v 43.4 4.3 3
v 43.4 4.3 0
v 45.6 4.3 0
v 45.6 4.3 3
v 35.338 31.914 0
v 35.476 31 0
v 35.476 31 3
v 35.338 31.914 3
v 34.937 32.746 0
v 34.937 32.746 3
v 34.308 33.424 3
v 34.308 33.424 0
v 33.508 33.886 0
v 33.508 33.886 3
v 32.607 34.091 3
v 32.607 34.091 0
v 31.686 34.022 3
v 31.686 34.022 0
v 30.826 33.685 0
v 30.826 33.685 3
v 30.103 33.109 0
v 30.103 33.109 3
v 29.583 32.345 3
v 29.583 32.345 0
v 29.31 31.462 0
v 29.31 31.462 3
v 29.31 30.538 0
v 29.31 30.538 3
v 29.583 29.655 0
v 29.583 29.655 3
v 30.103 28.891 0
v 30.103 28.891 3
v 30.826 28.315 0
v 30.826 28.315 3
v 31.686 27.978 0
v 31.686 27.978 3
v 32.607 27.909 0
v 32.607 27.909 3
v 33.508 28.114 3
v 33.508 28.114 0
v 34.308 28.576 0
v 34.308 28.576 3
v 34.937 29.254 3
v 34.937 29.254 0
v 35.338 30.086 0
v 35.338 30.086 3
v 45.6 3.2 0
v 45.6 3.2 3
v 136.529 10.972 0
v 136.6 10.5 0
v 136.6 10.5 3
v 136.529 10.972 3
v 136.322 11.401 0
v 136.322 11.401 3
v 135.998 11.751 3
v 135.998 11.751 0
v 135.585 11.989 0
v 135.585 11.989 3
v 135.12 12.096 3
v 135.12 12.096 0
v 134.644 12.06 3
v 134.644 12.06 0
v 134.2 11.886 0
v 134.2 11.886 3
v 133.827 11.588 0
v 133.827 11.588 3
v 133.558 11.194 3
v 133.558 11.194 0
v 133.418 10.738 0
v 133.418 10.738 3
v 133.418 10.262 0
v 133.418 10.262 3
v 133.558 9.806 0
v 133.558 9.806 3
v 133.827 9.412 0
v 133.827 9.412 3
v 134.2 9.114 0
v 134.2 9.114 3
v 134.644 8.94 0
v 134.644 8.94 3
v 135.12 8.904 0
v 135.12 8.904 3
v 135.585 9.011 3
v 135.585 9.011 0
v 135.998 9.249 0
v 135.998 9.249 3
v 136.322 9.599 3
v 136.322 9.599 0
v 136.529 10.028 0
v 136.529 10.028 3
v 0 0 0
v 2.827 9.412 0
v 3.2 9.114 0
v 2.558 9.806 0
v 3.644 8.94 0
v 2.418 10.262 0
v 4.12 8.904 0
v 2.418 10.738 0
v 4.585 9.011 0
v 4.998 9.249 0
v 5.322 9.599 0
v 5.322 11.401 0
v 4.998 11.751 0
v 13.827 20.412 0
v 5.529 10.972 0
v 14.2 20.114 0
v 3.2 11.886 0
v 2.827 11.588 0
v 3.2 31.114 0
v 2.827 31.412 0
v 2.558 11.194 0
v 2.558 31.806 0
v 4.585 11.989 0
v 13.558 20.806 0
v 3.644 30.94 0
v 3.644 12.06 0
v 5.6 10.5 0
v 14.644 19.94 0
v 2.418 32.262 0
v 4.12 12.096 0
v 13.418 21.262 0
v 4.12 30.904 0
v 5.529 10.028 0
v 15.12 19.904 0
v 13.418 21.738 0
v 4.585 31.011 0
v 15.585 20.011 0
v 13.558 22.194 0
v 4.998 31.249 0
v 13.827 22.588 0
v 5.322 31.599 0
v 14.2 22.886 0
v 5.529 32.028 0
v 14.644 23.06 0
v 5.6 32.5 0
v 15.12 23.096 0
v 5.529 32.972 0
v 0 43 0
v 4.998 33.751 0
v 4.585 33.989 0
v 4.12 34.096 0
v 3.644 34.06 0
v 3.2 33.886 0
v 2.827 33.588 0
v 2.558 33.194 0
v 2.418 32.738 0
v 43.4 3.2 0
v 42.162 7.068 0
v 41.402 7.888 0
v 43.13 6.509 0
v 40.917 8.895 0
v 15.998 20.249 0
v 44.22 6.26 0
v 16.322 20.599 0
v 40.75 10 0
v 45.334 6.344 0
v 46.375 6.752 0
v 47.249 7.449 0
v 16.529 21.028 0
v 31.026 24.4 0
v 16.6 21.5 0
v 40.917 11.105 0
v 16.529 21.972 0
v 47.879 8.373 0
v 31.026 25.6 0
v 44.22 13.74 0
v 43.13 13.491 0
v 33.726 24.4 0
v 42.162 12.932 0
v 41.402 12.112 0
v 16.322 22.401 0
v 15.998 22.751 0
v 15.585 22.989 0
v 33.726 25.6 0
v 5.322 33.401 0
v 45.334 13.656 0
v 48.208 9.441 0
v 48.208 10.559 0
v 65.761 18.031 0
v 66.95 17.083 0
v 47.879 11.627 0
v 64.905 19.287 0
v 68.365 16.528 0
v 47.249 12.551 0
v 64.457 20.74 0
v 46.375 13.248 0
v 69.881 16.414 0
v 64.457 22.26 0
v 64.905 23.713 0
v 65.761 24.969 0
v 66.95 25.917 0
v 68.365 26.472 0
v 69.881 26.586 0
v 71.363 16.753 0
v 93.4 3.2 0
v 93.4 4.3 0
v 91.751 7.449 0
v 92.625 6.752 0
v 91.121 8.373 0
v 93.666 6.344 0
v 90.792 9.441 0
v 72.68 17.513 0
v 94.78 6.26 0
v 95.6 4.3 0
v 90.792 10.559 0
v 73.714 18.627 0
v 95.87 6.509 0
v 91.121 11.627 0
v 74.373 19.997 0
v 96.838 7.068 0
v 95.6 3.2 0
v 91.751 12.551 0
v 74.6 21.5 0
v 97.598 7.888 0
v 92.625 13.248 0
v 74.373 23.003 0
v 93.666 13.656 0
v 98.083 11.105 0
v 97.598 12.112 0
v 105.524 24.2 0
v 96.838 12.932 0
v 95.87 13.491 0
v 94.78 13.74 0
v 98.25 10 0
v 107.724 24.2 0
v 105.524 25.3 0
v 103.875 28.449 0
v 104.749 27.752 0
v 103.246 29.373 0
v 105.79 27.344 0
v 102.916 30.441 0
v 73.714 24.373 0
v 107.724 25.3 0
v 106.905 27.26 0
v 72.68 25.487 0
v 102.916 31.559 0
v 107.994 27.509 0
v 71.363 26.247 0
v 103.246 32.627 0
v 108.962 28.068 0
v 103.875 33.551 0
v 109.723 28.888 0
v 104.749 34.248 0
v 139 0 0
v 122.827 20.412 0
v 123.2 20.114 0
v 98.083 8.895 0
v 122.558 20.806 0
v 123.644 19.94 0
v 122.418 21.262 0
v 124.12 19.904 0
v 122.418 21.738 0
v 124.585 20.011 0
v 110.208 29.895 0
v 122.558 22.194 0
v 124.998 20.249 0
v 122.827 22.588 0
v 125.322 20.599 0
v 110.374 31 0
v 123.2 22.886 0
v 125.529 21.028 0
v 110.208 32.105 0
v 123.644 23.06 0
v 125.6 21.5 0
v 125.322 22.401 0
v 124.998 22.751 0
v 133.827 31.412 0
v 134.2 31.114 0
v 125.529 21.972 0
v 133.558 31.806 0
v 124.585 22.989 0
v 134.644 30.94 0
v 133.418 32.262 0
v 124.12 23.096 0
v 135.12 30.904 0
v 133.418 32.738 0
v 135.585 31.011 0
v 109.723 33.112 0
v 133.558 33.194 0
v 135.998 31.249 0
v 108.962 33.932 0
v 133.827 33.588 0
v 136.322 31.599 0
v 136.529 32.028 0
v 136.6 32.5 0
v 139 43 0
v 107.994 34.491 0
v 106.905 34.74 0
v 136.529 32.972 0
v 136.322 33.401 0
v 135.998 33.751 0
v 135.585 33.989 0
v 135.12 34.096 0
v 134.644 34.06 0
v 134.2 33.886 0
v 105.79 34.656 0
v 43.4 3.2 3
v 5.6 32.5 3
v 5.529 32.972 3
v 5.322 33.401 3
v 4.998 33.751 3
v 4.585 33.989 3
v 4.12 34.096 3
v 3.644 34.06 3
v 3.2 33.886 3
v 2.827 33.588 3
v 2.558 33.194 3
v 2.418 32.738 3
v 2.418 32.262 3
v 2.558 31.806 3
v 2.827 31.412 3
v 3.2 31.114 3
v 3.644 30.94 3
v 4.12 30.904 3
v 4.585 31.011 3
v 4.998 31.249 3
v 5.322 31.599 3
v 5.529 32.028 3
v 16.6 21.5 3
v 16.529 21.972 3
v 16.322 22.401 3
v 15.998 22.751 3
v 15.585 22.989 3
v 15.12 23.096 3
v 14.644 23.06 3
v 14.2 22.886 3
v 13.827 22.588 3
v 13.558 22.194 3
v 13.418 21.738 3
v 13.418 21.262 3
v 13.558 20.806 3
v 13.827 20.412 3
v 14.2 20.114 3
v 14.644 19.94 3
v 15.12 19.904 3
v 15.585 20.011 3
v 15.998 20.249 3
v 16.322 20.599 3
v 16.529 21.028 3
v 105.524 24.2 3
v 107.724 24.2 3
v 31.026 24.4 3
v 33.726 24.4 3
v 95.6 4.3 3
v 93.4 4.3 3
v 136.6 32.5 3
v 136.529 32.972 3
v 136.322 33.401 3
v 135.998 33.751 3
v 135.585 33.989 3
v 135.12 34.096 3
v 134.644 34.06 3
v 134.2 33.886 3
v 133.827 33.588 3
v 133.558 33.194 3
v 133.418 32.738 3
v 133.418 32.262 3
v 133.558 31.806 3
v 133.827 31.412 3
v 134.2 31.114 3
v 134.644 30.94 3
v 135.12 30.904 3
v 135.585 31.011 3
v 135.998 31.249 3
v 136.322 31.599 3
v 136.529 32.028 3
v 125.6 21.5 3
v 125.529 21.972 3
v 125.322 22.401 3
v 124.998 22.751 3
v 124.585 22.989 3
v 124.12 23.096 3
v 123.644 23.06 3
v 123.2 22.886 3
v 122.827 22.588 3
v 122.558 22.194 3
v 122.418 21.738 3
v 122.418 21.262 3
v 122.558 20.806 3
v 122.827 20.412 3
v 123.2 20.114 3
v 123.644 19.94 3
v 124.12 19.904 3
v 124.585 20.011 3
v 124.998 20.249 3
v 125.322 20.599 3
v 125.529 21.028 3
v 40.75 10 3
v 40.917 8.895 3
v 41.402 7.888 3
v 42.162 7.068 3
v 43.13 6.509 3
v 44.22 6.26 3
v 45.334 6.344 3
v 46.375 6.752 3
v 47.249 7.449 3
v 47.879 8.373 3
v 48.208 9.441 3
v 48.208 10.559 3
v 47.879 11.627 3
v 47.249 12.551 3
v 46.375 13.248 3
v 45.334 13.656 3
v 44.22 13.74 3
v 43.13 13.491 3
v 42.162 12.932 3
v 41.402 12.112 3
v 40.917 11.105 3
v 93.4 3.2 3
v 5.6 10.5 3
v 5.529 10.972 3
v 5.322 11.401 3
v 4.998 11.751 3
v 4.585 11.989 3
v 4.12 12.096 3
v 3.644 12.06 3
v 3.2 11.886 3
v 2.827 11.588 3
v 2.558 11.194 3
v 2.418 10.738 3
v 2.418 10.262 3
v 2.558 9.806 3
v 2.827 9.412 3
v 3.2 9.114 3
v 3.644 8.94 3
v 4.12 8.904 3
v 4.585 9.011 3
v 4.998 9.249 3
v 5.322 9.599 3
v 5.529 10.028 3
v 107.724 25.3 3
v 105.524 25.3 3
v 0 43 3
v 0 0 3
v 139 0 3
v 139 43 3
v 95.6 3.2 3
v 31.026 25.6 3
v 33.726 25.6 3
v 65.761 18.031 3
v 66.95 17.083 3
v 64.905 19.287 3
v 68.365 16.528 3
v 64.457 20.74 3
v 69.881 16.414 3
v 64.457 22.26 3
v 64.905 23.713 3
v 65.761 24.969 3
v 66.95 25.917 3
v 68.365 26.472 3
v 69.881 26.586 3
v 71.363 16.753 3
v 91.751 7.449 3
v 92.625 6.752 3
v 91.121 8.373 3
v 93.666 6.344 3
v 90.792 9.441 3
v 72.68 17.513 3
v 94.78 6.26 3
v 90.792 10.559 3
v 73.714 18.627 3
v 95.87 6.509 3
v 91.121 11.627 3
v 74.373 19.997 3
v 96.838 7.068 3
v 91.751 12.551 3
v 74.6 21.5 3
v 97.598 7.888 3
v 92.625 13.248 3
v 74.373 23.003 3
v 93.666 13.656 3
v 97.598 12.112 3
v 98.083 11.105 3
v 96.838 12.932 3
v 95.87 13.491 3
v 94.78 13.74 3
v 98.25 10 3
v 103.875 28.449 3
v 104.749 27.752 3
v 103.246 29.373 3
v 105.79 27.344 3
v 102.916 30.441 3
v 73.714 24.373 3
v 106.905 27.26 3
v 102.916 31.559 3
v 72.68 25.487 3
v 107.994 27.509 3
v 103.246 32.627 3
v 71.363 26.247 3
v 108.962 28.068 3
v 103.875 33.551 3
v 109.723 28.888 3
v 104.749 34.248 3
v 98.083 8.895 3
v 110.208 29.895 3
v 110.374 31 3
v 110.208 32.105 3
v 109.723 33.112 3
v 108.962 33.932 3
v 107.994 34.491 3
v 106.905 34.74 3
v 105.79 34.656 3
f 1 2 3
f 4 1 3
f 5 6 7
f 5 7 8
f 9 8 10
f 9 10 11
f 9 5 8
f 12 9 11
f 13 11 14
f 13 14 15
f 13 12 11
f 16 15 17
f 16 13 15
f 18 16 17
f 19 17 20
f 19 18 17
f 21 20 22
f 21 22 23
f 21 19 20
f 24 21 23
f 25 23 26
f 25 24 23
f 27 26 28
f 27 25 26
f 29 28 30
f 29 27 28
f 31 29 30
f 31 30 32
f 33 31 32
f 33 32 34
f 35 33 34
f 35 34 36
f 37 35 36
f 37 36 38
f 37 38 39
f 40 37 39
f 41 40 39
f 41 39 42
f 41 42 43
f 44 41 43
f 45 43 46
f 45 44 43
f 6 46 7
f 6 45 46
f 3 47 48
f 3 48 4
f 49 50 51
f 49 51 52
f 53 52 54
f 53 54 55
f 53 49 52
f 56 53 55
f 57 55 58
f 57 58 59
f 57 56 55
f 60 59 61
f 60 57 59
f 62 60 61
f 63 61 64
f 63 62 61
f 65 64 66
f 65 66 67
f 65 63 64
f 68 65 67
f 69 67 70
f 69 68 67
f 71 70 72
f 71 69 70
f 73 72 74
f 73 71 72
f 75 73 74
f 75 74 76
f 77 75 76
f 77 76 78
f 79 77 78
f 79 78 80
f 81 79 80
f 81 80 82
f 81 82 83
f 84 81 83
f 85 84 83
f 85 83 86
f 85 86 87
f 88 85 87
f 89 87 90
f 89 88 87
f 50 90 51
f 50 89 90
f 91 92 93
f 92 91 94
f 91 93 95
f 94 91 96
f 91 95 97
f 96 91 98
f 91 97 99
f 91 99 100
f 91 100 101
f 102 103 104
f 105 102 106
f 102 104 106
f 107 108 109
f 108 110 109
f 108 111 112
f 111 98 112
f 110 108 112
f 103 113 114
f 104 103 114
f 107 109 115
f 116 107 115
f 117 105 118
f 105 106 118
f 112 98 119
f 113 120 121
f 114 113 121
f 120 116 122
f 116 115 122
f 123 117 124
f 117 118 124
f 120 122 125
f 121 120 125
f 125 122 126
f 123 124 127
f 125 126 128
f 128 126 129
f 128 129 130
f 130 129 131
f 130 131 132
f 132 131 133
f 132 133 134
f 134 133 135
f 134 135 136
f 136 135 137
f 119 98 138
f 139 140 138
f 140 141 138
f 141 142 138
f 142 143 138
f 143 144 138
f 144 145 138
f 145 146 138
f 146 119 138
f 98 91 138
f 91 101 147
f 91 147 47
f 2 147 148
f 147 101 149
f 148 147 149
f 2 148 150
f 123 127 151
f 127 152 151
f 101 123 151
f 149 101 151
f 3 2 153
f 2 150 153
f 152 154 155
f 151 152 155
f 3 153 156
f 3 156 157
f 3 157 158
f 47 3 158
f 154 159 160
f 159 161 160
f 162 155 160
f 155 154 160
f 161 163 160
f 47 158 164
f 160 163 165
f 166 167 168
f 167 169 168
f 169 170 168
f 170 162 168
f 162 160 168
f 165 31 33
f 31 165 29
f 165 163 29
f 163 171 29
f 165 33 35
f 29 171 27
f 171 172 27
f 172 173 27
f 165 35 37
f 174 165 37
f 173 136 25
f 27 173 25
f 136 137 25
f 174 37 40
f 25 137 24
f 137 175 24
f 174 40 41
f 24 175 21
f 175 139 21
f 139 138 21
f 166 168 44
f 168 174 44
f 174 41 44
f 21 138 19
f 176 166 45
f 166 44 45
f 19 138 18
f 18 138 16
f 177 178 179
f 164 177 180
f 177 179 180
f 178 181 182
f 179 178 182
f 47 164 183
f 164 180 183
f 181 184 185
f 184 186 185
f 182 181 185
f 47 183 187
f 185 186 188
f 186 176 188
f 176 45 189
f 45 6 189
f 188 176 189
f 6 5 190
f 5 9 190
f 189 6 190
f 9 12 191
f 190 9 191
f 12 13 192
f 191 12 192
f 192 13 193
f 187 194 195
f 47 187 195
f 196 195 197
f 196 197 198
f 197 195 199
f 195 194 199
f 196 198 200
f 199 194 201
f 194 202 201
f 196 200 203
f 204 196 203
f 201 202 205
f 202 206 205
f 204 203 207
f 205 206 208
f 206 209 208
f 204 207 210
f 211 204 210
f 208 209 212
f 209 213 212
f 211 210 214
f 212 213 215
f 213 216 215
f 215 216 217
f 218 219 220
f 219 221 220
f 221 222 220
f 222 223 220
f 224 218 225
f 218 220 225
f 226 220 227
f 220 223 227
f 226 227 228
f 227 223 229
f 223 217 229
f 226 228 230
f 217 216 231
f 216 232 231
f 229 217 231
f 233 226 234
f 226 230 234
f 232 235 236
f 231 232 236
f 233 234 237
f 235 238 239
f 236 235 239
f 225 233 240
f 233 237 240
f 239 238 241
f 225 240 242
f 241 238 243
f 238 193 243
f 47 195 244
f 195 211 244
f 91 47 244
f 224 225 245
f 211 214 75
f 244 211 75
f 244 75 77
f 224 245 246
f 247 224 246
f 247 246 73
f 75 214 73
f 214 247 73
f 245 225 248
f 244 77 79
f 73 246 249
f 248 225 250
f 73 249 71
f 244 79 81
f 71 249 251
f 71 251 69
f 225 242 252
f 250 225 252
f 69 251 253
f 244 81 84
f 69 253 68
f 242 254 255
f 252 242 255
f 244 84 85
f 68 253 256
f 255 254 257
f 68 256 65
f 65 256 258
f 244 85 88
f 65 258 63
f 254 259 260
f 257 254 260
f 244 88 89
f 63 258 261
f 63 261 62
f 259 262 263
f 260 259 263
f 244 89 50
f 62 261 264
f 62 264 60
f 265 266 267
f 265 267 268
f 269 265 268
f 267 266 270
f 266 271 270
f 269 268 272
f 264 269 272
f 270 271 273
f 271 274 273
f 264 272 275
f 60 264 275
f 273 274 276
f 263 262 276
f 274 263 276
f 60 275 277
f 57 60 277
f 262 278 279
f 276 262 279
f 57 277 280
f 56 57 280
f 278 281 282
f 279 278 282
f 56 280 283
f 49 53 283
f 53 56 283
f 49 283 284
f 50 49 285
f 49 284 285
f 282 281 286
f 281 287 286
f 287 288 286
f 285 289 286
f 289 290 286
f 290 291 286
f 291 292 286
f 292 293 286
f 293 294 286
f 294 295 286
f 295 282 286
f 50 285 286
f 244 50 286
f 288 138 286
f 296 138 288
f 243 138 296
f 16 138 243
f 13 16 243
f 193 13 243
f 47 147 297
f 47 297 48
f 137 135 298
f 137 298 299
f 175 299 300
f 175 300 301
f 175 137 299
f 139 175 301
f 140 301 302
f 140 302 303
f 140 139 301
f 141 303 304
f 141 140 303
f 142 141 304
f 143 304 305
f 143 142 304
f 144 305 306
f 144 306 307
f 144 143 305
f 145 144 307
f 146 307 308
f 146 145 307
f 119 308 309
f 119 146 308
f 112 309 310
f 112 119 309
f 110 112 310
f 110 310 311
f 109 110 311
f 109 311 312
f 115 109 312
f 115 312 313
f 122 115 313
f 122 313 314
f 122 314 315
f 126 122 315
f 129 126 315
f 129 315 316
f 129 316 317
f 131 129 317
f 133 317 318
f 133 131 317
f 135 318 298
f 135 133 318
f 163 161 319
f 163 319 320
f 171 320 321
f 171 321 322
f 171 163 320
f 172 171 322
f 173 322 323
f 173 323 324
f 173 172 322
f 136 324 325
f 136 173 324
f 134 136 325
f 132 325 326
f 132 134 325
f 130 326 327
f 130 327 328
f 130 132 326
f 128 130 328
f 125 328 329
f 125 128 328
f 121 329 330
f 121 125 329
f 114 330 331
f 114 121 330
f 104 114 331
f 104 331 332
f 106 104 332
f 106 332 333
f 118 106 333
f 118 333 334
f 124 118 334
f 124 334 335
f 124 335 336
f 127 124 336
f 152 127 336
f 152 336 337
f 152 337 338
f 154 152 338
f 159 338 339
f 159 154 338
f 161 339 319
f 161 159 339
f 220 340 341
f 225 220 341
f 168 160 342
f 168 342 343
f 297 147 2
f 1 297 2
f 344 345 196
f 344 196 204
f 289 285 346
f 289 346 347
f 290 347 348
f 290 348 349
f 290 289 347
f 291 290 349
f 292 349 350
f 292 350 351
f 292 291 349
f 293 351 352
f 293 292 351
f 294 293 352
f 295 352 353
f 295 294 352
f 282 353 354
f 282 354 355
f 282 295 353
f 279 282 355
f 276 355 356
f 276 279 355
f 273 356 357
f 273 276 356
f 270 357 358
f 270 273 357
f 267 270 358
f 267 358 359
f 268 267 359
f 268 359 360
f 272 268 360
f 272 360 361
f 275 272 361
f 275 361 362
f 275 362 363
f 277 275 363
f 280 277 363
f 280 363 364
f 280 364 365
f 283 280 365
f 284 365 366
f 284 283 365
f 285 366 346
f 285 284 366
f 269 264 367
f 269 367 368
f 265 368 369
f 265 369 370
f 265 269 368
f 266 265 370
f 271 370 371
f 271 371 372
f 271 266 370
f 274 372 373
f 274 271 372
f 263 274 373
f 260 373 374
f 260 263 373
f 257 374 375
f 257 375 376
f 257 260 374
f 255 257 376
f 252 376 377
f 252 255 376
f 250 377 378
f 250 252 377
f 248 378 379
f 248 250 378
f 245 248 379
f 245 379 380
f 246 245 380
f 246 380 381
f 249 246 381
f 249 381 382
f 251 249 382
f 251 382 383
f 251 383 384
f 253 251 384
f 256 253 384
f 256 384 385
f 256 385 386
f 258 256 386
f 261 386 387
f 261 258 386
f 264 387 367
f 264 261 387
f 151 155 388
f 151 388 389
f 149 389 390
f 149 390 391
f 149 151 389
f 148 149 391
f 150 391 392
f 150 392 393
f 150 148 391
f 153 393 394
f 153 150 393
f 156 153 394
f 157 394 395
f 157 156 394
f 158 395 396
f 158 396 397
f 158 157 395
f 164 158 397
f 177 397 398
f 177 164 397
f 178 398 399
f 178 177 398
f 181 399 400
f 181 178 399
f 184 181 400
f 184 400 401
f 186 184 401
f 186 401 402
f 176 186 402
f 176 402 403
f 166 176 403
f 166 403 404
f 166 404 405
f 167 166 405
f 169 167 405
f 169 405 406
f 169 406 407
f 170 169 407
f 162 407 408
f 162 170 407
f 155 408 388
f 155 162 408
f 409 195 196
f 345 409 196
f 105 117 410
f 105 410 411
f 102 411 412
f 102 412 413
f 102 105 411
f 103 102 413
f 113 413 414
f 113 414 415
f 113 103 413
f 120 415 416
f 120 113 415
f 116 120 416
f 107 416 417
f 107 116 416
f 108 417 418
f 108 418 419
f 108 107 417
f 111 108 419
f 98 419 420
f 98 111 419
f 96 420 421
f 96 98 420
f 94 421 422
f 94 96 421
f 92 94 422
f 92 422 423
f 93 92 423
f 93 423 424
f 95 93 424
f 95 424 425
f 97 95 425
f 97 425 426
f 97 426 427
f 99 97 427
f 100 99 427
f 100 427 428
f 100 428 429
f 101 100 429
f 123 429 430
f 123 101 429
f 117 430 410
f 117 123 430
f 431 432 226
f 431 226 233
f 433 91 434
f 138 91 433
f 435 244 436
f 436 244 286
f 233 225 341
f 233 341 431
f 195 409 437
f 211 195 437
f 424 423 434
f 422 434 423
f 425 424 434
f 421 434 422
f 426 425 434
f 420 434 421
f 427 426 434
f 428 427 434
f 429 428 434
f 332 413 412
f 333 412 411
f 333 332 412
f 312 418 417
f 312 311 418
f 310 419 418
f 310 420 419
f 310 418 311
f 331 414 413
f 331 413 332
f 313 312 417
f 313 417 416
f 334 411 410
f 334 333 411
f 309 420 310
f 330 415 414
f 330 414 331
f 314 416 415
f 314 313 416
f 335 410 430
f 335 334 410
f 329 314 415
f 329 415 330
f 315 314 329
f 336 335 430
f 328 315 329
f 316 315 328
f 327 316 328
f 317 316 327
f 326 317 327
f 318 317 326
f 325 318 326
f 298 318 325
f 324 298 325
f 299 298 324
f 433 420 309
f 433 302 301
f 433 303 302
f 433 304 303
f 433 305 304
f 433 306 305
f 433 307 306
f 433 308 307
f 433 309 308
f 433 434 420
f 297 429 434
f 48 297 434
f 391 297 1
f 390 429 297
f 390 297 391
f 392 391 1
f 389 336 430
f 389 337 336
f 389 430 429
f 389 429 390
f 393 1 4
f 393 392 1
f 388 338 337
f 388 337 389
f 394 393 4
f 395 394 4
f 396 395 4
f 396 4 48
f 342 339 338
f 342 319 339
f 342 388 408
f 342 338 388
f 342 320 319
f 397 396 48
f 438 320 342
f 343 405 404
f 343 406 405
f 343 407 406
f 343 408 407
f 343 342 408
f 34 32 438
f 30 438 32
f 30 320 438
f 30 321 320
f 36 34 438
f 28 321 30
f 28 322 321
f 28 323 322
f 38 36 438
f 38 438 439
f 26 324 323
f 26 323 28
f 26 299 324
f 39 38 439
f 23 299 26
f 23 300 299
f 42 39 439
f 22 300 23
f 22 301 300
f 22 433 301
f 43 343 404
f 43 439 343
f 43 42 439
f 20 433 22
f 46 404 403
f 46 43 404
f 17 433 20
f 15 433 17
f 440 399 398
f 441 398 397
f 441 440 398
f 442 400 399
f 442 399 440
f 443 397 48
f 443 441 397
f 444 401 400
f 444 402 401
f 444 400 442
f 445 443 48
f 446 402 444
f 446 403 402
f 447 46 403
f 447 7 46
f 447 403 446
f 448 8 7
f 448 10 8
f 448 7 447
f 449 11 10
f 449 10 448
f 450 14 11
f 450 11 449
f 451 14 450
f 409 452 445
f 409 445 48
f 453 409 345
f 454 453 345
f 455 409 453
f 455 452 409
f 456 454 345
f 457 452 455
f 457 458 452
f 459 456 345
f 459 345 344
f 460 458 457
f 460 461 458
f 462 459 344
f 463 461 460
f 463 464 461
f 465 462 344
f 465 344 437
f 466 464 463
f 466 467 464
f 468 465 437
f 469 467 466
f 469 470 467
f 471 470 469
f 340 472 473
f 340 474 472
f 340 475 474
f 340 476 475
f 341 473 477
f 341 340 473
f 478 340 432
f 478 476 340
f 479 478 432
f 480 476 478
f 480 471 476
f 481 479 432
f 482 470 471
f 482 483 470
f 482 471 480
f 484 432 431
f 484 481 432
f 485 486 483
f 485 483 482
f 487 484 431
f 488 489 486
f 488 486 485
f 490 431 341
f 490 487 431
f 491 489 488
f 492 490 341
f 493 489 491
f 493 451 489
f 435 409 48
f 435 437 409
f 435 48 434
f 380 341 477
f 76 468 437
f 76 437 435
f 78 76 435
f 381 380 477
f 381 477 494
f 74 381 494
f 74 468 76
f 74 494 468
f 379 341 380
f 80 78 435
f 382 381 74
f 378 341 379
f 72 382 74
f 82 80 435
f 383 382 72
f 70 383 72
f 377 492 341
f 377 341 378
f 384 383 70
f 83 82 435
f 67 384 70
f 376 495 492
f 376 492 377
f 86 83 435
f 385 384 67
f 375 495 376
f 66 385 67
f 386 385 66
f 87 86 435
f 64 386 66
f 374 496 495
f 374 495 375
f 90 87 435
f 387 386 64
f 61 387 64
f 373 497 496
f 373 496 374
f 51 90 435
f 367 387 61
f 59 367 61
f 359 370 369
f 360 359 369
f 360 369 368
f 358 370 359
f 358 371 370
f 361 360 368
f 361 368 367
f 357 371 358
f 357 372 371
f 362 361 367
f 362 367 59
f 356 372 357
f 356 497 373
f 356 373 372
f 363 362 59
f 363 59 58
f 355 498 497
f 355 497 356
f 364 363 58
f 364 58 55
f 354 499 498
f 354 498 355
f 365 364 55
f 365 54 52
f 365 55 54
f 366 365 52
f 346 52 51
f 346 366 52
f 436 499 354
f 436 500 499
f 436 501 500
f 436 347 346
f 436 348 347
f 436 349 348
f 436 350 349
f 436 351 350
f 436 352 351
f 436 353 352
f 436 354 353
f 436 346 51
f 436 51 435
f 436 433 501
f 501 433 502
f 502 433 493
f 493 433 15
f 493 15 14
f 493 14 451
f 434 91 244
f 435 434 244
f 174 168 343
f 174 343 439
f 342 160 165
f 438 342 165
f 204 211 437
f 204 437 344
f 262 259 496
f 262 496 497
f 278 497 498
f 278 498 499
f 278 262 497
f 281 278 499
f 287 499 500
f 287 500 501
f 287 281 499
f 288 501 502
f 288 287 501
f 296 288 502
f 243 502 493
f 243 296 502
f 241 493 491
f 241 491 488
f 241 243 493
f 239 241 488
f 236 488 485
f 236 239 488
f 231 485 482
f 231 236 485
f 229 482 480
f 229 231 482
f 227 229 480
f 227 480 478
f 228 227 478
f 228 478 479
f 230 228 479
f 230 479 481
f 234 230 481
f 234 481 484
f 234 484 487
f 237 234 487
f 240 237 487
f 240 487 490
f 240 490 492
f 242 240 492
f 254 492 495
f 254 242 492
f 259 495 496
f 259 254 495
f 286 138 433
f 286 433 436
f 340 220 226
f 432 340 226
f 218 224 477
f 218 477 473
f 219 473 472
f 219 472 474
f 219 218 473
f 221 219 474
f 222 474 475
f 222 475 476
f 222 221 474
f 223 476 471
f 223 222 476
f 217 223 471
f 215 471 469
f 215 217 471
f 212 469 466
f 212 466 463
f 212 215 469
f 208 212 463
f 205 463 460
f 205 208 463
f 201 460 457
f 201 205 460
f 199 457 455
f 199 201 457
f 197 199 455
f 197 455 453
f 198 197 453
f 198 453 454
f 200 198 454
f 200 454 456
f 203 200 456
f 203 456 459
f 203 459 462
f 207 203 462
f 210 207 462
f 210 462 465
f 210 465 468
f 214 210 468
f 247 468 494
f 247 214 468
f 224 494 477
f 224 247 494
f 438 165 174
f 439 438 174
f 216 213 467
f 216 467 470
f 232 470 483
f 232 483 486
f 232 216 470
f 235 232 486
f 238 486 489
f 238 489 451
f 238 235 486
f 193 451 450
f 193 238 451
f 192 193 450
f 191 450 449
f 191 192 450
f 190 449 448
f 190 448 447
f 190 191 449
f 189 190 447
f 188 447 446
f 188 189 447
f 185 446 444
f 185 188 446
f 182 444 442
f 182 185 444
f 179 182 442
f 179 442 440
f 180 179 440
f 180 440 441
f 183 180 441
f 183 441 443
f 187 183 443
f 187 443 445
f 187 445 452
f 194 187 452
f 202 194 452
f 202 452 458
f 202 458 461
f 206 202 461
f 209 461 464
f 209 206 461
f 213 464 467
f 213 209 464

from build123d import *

# Parameters (mm, degrees)
SKETCH1_W           = 139
SKETCH1_H           = 43
SKETCH1_R           = 3.1
SKETCH1_R_2         = 3.75
SKETCH1_R_3         = 1.6
SKETCH1_R_4         = 5.1
SKETCH1_W_2         = 2.7
SKETCH1_H_2         = 1.2
SKETCH1_W_3         = 2.2
SKETCH1_H_3         = 1.1
BOSS_EXTRUDE1_DEPTH = 3


with BuildPart() as part:
    # Sketch1 → Boss-Extrude1 (new body)
    with BuildSketch(Plane.XY):
        with Locations((69.5, 21.5)):
            Rectangle(SKETCH1_W, SKETCH1_H)
        with Locations((32.375644347, 31)):
            Circle(SKETCH1_R, mode=Mode.SUBTRACT)
        with Locations((94.5, 10)):
            Circle(SKETCH1_R_2, mode=Mode.SUBTRACT)
        with Locations((4, 32.5)):
            Circle(SKETCH1_R_3, mode=Mode.SUBTRACT)
        with Locations((135, 32.5)):
            Circle(SKETCH1_R_3, mode=Mode.SUBTRACT)
        with Locations((135, 10.5)):
            Circle(SKETCH1_R_3, mode=Mode.SUBTRACT)
        with Locations((4, 10.5)):
            Circle(SKETCH1_R_3, mode=Mode.SUBTRACT)
        with Locations((69.5, 21.5)):
            Circle(SKETCH1_R_4, mode=Mode.SUBTRACT)
        with Locations((15, 21.5)):
            Circle(SKETCH1_R_3, mode=Mode.SUBTRACT)
        with Locations((124, 21.5)):
            Circle(SKETCH1_R_3, mode=Mode.SUBTRACT)
        with Locations(Location((44.5, 10, 0), (0, 0, 180))):
            Circle(SKETCH1_R_2, mode=Mode.SUBTRACT)
        with Locations((106.624355653, 31)):
            Circle(SKETCH1_R_2, mode=Mode.SUBTRACT)
        with Locations((32.375644347, 25)):
            Rectangle(SKETCH1_W_2, SKETCH1_H_2, mode=Mode.SUBTRACT)
        with Locations((94.5, 3.75)):
            Rectangle(SKETCH1_W_3, SKETCH1_H_3, mode=Mode.SUBTRACT)
        with Locations((44.5, 3.75)):
            Rectangle(SKETCH1_W_3, SKETCH1_H_3, mode=Mode.SUBTRACT)
        with Locations((106.624355653, 24.75)):
            Rectangle(SKETCH1_W_3, SKETCH1_H_3, mode=Mode.SUBTRACT)
    extrude(amount=BOSS_EXTRUDE1_DEPTH)


solid = part.part
